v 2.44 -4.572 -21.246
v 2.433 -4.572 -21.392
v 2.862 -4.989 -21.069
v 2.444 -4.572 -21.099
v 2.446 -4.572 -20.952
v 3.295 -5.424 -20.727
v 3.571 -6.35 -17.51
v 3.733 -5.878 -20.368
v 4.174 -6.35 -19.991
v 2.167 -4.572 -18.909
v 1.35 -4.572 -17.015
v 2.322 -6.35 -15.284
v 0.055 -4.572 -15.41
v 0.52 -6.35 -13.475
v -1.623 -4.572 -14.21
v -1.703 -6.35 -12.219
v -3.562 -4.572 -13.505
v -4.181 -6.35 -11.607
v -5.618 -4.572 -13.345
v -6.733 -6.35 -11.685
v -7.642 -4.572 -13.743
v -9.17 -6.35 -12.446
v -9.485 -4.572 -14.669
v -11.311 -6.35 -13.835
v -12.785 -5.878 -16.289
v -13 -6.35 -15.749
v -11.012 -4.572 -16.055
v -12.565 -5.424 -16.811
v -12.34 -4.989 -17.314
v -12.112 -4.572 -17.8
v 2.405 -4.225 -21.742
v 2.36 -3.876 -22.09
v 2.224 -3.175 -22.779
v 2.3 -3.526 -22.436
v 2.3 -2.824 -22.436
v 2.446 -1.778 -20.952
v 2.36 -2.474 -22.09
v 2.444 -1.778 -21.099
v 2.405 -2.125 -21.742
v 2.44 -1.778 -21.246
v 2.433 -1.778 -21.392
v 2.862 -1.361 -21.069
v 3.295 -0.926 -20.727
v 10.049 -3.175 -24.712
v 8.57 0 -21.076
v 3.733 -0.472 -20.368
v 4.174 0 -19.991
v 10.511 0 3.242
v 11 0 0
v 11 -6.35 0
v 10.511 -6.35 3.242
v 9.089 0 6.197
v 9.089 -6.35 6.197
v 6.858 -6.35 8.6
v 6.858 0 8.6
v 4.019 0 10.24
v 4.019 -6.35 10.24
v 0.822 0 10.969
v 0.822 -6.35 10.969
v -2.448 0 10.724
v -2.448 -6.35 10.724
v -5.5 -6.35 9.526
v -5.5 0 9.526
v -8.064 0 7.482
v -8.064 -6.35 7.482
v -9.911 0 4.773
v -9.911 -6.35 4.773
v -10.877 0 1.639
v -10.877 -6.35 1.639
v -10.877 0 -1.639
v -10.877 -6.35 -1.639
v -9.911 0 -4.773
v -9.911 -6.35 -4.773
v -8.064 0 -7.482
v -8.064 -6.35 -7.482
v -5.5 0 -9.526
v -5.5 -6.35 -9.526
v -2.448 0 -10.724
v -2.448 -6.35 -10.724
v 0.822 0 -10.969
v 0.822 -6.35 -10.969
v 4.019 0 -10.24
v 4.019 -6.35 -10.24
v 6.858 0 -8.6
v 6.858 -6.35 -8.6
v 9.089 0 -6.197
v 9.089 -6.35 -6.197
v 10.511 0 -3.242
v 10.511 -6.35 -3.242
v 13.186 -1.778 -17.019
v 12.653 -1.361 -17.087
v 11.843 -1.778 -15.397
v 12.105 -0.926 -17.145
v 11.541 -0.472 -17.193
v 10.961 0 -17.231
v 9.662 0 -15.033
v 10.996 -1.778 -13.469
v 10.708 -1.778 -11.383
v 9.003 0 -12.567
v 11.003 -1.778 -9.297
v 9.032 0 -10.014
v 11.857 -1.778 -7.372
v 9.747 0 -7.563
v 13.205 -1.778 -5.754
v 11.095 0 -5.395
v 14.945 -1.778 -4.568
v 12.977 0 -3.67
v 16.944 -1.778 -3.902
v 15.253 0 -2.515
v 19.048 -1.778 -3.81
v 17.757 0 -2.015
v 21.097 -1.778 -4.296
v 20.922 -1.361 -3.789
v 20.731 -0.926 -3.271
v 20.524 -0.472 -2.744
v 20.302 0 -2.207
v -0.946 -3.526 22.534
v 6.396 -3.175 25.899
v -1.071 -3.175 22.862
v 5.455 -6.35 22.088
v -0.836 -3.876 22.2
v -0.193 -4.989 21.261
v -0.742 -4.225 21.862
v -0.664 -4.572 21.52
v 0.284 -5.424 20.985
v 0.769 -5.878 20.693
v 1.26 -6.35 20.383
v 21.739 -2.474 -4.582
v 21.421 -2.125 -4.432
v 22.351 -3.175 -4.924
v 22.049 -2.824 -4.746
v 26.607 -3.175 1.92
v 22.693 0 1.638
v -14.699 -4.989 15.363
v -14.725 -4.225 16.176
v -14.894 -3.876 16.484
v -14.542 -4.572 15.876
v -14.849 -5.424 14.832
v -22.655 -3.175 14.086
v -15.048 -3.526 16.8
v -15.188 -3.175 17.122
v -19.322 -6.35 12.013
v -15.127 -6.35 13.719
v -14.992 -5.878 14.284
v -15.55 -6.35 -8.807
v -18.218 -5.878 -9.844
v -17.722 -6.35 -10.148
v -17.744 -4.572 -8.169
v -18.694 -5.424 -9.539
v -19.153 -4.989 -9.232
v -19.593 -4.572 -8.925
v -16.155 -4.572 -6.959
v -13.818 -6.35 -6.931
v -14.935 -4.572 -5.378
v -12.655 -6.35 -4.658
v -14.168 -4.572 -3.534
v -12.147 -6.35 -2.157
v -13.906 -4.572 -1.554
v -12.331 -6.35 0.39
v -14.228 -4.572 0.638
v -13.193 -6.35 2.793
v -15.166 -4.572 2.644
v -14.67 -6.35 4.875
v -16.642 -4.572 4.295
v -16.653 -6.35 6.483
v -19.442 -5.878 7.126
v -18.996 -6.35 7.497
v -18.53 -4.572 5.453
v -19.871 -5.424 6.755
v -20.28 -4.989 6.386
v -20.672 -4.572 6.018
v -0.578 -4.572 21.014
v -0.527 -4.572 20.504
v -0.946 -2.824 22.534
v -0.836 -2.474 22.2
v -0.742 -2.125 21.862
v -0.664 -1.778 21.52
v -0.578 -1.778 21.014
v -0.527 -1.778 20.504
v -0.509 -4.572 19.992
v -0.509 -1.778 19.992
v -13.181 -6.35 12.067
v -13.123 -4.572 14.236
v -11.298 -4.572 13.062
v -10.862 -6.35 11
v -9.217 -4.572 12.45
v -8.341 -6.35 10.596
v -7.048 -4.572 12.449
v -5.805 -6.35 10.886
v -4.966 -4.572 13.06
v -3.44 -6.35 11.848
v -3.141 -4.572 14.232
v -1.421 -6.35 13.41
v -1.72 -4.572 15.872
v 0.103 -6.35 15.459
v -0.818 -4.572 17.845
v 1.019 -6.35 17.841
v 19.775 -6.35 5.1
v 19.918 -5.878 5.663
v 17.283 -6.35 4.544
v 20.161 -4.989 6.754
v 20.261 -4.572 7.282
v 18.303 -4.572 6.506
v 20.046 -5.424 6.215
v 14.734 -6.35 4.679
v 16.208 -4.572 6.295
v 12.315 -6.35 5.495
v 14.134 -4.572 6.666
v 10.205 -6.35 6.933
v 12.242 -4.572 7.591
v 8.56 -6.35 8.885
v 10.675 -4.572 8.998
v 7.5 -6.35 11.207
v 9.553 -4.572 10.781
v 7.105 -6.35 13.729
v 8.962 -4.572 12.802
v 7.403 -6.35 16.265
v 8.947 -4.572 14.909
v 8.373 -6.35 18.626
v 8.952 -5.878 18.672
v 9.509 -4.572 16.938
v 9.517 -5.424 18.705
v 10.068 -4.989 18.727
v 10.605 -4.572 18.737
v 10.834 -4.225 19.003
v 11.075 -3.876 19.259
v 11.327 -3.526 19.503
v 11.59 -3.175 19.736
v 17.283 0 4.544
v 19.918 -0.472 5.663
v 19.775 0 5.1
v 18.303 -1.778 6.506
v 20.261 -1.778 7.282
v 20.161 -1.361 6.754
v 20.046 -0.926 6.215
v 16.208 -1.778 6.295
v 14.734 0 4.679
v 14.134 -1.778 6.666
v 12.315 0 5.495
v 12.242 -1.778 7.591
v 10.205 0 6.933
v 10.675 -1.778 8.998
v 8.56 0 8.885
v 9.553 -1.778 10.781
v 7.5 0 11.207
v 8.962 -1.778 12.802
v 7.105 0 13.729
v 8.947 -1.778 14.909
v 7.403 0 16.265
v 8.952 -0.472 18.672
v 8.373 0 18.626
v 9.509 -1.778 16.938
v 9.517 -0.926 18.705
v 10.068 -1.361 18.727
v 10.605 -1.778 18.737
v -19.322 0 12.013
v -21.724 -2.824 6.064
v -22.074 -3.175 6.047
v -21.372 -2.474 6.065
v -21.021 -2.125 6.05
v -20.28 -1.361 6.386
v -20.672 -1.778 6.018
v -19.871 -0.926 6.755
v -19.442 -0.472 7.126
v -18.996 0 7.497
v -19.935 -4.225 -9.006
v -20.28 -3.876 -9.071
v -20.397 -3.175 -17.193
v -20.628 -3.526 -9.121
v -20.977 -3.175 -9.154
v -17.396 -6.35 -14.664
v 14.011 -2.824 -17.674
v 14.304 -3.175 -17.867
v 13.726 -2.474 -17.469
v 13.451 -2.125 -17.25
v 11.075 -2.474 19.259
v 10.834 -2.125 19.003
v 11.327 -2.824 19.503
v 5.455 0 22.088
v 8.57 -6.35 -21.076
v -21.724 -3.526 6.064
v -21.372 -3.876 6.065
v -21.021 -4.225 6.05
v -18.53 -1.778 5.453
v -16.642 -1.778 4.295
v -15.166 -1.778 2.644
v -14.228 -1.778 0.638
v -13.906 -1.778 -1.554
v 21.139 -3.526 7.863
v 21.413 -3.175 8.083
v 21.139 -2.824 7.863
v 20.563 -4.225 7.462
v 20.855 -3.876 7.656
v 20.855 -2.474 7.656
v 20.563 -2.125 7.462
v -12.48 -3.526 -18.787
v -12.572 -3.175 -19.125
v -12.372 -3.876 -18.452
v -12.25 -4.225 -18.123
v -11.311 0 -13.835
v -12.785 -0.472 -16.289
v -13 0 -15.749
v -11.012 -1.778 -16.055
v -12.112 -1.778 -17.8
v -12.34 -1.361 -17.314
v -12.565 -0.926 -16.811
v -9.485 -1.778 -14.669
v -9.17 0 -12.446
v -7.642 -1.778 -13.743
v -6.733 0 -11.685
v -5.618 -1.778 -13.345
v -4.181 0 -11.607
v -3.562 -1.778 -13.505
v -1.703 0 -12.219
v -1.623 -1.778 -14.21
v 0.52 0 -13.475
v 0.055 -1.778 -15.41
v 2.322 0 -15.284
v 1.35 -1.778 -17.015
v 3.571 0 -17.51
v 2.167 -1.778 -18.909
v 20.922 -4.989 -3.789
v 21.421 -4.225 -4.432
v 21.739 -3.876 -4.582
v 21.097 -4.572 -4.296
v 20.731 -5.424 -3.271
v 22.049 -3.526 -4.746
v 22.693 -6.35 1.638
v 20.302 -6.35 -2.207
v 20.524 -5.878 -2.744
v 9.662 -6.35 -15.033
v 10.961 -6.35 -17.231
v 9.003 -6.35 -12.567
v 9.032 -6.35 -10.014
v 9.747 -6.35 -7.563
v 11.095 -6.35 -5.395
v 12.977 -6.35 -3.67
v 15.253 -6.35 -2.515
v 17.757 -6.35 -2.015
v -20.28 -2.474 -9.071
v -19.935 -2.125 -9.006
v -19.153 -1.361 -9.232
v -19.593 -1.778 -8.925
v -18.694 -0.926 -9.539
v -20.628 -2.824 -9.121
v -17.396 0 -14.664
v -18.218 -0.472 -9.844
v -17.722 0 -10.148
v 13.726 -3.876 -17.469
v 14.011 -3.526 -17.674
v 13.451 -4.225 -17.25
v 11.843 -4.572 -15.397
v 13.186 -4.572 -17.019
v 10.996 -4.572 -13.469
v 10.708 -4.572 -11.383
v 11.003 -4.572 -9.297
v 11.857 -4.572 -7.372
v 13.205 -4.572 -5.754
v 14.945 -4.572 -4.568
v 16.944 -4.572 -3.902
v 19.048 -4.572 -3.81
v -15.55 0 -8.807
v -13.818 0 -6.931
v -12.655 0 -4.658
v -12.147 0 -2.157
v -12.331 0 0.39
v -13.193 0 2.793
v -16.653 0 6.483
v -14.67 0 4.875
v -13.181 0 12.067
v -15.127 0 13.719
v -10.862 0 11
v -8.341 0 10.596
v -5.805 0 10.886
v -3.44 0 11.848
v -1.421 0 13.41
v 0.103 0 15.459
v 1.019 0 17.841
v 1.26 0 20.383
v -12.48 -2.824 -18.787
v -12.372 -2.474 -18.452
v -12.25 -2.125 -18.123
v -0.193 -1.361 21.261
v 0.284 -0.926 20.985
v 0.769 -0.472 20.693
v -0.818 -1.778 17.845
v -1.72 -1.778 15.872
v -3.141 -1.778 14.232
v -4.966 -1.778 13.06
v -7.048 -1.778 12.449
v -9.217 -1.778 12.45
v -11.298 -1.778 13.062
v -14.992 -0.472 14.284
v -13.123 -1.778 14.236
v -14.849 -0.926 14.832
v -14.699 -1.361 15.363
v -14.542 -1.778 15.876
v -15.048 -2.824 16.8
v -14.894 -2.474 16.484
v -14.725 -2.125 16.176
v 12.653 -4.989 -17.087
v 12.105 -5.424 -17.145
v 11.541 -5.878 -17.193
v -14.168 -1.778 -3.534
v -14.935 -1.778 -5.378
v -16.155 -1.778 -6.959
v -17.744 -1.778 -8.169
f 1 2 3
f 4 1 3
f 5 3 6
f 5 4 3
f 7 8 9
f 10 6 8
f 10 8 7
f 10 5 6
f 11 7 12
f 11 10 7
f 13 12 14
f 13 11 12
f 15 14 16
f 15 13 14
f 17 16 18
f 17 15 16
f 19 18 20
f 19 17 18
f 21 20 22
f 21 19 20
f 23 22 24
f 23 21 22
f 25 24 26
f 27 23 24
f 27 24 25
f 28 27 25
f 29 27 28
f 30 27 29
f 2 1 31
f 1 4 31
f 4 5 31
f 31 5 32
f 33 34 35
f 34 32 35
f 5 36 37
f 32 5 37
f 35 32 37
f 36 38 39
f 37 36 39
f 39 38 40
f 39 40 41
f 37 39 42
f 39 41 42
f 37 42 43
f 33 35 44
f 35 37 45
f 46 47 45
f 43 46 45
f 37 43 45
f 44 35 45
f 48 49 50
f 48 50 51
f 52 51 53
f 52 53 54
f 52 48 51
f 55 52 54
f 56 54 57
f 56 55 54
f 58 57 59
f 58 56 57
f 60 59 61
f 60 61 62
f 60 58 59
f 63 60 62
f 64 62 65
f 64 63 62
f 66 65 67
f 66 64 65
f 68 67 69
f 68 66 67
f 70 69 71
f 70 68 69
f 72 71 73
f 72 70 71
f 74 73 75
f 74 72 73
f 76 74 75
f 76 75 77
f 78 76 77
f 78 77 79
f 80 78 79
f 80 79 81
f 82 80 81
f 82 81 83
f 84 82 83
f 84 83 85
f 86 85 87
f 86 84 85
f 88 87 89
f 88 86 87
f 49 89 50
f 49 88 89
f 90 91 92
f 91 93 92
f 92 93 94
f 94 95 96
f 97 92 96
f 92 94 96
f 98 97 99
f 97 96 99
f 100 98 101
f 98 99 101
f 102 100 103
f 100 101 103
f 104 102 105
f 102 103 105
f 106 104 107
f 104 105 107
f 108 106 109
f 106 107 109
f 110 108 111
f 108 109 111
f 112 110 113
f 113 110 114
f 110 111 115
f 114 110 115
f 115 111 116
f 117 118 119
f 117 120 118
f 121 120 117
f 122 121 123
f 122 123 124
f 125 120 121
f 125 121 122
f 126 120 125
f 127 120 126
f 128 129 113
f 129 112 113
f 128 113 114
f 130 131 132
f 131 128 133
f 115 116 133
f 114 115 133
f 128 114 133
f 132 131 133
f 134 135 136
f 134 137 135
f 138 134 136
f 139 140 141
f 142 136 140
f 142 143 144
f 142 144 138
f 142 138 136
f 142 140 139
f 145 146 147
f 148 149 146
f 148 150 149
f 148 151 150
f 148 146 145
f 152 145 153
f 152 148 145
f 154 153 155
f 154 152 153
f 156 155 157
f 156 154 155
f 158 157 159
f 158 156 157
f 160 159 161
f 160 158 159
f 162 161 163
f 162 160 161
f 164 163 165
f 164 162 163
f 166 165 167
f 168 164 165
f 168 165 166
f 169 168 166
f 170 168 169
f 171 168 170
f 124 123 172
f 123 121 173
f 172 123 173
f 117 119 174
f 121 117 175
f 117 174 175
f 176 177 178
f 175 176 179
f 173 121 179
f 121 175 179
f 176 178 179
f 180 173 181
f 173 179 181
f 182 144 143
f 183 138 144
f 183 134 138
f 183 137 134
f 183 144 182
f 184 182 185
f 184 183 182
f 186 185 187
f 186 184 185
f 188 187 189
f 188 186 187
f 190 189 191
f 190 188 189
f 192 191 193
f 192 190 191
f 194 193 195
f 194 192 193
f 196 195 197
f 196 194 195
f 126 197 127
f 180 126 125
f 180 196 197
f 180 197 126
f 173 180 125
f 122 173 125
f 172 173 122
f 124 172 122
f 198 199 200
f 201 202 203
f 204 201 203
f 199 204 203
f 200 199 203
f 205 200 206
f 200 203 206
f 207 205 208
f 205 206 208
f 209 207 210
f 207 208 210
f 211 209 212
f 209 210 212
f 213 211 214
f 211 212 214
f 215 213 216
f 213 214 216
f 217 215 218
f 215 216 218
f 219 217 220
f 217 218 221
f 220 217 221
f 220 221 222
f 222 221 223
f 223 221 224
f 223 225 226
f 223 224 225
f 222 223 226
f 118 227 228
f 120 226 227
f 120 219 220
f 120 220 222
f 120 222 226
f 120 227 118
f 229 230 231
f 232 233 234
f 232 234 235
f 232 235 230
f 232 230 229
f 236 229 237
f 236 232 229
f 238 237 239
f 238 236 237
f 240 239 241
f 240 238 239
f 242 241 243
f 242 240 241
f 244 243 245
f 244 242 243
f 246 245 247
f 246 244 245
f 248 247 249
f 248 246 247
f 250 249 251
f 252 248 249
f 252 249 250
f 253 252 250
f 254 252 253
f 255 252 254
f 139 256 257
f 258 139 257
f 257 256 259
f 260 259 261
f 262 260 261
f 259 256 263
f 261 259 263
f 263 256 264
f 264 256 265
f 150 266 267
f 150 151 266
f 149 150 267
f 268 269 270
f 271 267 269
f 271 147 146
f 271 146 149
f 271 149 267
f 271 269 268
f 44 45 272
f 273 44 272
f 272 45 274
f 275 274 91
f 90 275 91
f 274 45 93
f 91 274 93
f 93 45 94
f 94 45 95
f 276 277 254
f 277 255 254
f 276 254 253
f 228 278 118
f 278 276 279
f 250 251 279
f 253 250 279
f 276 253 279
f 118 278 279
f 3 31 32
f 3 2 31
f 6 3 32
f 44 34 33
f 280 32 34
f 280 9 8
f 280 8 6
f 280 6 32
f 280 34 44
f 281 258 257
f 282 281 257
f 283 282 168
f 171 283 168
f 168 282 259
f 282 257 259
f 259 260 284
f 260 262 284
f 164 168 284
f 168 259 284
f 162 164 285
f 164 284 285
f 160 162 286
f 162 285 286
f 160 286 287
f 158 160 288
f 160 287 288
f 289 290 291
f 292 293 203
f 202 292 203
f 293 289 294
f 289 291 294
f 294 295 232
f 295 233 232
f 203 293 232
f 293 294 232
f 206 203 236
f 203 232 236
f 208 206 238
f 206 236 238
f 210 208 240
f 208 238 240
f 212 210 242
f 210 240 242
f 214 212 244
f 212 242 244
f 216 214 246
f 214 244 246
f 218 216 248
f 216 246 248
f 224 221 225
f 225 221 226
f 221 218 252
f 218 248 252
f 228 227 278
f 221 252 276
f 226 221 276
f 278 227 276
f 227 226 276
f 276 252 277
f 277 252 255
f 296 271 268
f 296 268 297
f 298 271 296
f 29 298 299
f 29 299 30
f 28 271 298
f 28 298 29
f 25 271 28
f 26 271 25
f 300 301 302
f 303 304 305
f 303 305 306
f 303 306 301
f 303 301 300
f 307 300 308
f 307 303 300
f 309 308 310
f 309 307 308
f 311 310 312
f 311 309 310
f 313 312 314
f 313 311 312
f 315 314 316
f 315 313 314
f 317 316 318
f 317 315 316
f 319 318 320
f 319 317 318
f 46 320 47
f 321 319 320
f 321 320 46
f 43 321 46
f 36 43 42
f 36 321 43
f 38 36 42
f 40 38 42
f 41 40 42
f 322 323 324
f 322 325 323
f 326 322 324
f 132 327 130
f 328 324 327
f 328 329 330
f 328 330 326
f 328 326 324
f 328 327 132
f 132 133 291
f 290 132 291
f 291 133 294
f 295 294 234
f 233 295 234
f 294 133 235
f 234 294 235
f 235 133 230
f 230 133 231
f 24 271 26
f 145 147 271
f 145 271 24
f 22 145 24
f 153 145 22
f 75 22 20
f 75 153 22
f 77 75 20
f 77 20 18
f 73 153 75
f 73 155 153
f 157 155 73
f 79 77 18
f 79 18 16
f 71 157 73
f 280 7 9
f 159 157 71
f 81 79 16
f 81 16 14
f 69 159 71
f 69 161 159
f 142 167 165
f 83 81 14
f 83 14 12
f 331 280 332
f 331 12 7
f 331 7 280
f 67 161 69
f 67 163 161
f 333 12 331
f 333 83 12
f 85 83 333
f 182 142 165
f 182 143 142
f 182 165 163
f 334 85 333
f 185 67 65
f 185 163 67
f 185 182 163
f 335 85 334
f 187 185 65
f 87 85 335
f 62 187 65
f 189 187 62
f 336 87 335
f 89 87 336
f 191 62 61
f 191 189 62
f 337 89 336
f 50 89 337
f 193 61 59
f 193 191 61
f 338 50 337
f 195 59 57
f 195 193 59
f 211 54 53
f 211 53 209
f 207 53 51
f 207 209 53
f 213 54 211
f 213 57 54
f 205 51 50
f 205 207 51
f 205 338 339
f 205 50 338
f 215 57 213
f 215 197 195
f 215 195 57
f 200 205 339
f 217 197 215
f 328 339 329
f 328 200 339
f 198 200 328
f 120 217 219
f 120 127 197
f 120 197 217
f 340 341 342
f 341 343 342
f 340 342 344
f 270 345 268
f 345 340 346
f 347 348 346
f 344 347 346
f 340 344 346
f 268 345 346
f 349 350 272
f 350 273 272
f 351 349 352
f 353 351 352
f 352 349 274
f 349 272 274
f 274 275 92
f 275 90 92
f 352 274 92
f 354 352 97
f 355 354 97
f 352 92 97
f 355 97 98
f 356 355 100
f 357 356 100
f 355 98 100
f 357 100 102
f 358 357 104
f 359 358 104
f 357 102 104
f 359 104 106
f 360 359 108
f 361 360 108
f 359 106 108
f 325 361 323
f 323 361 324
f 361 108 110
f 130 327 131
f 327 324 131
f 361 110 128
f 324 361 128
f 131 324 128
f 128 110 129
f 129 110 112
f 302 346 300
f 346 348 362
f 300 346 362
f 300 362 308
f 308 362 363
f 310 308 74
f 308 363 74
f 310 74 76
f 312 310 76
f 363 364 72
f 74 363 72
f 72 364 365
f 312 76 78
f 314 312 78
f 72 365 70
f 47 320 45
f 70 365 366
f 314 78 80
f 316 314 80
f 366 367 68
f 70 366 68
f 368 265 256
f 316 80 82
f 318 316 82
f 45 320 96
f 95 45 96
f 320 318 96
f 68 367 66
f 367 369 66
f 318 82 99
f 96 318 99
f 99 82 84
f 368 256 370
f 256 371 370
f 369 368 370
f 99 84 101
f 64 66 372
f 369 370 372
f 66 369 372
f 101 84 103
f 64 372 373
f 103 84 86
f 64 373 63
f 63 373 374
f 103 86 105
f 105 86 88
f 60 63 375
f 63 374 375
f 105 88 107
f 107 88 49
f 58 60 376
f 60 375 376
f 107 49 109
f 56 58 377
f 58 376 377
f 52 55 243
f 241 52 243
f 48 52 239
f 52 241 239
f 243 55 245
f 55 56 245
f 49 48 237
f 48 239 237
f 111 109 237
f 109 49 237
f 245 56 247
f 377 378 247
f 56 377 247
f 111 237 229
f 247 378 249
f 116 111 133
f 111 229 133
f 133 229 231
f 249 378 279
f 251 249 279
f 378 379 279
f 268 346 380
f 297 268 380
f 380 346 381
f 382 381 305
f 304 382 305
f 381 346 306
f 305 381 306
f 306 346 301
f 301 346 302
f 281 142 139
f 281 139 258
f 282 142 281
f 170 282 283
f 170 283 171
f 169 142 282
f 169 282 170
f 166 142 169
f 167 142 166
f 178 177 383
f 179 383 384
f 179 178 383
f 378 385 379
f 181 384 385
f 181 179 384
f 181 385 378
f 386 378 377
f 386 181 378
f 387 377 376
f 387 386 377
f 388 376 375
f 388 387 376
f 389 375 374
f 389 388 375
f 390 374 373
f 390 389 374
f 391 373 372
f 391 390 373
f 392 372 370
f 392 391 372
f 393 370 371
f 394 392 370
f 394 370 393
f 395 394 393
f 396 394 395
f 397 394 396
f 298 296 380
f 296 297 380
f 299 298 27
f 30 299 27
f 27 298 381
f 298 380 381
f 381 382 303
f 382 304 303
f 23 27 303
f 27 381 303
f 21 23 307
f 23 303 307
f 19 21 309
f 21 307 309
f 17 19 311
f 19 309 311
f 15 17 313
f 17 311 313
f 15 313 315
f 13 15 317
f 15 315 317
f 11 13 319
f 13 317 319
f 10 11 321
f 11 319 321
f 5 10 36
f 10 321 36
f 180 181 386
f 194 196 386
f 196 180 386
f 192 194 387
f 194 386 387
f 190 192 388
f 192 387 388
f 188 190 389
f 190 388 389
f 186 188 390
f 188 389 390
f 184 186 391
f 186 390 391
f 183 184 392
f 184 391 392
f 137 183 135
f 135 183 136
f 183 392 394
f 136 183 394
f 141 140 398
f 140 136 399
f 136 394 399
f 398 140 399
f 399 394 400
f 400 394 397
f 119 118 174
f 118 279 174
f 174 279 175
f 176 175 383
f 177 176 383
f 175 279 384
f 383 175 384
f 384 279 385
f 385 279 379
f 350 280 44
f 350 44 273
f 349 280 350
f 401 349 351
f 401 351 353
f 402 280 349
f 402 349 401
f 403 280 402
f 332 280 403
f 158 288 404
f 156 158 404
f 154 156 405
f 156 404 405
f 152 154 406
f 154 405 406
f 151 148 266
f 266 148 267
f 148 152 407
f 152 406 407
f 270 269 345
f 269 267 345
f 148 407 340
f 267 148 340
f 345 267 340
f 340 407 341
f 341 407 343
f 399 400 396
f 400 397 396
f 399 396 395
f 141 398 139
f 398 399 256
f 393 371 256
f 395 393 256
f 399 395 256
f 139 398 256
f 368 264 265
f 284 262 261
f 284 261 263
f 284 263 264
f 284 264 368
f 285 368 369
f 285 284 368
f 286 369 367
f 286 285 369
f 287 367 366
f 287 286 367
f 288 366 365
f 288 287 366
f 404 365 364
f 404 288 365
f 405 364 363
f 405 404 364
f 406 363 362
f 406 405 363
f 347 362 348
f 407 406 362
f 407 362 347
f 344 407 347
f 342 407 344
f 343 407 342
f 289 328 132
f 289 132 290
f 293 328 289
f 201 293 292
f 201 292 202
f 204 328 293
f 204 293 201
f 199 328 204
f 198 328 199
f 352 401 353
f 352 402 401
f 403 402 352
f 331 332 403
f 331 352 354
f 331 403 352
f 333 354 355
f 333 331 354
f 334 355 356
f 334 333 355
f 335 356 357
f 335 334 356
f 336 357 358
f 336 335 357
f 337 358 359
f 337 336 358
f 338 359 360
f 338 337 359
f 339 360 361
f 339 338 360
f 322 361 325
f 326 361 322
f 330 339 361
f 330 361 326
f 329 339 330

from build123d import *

# Parameters (mm, degrees)
F0_R         = 11
F1_DEPTH     = 6.35
F2_SIZE      = 3.17499
F3_T2_ANGLE  = 199.5715846066
F3_T4_ANGLE  = 199.5715846066
F3_T6_ANGLE  = 199.5715846066
F3_T8_ANGLE  = 199.5715846066
F3_T10_ANGLE = 199.5715846066
F3_T12_ANGLE = 199.5715846066
F3_T14_ANGLE = 199.5715846066
F3_T16_ANGLE = 199.5715846066
F3_T18_ANGLE = 199.5715846066
F3_T20_ANGLE = 199.5715846066


# Not quite as in the source:
# - a fillet or chamfer that OpenCascade refuses, or shapes differently, is made with other operations: its cross-section is extruded or revolved along the edge and cut away or added
# - a fillet or chamfer is up to 0.001 mm smaller than in the source, because OpenCascade refuses the exact size


with BuildPart() as f1:
    # F0 (on Front) → F1 (new body)
    with BuildSketch(Plane.XZ):
        with BuildLine():
            Line((11.5903794876, 19.7357752055), (6.395639386, 25.8985348046))
            Line((6.395639386, 25.8985348046), (-1.0707562618, 22.8624408289))
            ThreePointArc((-1.0707562618, 22.8624408289), (-0.6511189694, 21.4544603732), (-0.5094848211, 19.9921183513))
            ThreePointArc((-0.5094848211, 19.9921183513), (-6.6671427992, 12.5137524996), (-15.1882133804, 17.1217958736))
            Line((-15.1882133804, 17.1217958736), (-22.6546090282, 14.085701898))
            Line((-22.6546090282, 14.085701898), (-22.0743552105, 6.0465330289))
            ThreePointArc((-22.0743552105, 6.0465330289), (-16.3352014079, 4.025037517), (-13.9057833978, -1.5536951891))
            ThreePointArc((-13.9057833978, -1.5536951891), (-15.9470506916, -6.744277179), (-20.977211585, -9.1539234072))
            Line((-20.977211585, -9.1539234072), (-20.3969577673, -17.1930922762))
            Line((-20.3969577673, -17.1930922762), (-12.5719455381, -19.125477903))
            ThreePointArc((-12.5719455381, -19.125477903), (-4.2540087238, -13.3881176755), (2.4458190468, -20.9523547863))
            ThreePointArc((2.4458190468, -20.9523547863), (2.3900561576, -21.8725270157), (2.2235836317, -22.7792316697))
            Line((2.2235836317, -22.7792316697), (10.0485958609, -24.7116172964))
            Line((10.0485958609, -24.7116172964), (14.3044655632, -17.866728424))
            ThreePointArc((14.3044655632, -17.866728424), (11.8568074939, -7.3720740717), (22.3514618462, -4.9244160023))
            Line((22.3514618462, -4.9244160023), (26.6073315486, 1.9204728701))
            Line((26.6073315486, 1.9204728701), (21.412591447, 8.0832324691))
            ThreePointArc((21.412591447, 8.0832324691), (10.6752140991, 8.9983978576), (11.5903794876, 19.7357752055))
        make_face()
        Circle(F0_R, mode=Mode.SUBTRACT)
    extrude(amount=F1_DEPTH)

    # F2 (size 3.175 in the source; OpenCascade refuses exactly that, so slightly less here)
    f2_edges = [f1.edges().sort_by_distance(p)[0] for p in [
        (24.479397, -6.35, -1.501972),
        (24.009961, -6.35, 5.001853),
        (8.993009, -6.35, 22.817155),
        (2.662442, -6.35, 24.380488),
        (-18.921411, -6.35, 15.603749),
        (-22.364482, -6.35, 10.066117),
        (-20.687085, -6.35, -13.173508),
        (-16.484452, -6.35, -18.159285),
        (24.009961, 0, 5.001853),
        (24.479397, 0, -1.501972),
        (8.993009, 0, 22.817155),
        (2.662442, 0, 24.380488),
        (-18.921411, 0, 15.603749),
        (-22.364482, 0, 10.066117),
        (-20.687085, 0, -13.173508),
        (-16.484452, 0, -18.159285),
        (6.13609, 0, -23.745424),
        (12.176531, 0, -21.289173),
        (12.176531, -6.35, -21.289173),
        (6.13609, -6.35, -23.745424),
    ]]
    chamfer(f2_edges, length=F2_SIZE)

    # F3: chamfer of 1.778 on 10 edges, made by hand

    # F3_s1 → F3_t2 (revolve, cut)
    with BuildSketch(Plane(origin=(19.7071717725, 0, -7.9965849701), x_dir=(0, 1, 0), z_dir=(0.9266214967, 0, -0.3759954812))):
        Polygon((-1.778, -11.2881506475), (0, -13.0661506475), (0, -11.2881506475), align=None)
    revolve(axis=Axis((18.3279637047, 0, -11.3955722132), (0, 1, 0)), revolution_arc=F3_T2_ANGLE, mode=Mode.SUBTRACT)

    # F3_s3 → F3_t4 (revolve, cut)
    with BuildSketch(Plane(origin=(19.7071717725, 0, -7.9965849701), x_dir=(0, 1, 0), z_dir=(0.9266214967, 0, -0.3759954812))):
        Polygon((-4.572, -11.2881506475), (-6.35, -13.0661506475), (-6.35, -11.2881506475), align=None)
    revolve(axis=Axis((18.3279637047, -6.35, -11.3955722132), (0, 1, 0)), revolution_arc=F3_T4_ANGLE, mode=Mode.SUBTRACT)

    # F3_s5 → F3_t6 (revolve, cut)
    with BuildSketch(Plane(origin=(-8.534063628, 0, -19.4804452837), x_dir=(0, 1, 0), z_dir=(-0.4012674626, 0, -0.915960929))):
        Polygon((-6.35, 13.0661506475), (-4.572, 11.2881506475), (-6.35, 11.2881506475), align=None)
    revolve(axis=Axis((-5.1741809532, -6.35, -20.9523547863), (0, -1, 0)), revolution_arc=F3_T6_ANGLE, mode=Mode.SUBTRACT)

    # F3_s7 → F3_t8 (revolve, cut)
    with BuildSketch(Plane(origin=(-1.5153532552, 0, -21.2137147847), x_dir=(0, 1, 0), z_dir=(-0.0712511627, 0, -0.9974584061))):
        Polygon((0, -13.0661506475), (-1.778, -11.2881506475), (0, -11.2881506475), align=None)
    revolve(axis=Axis((-5.1741809532, 0, -20.9523547863), (0, 1, 0)), revolution_arc=F3_T8_ANGLE, mode=Mode.SUBTRACT)

    # F3_s9 → F3_t10 (revolve, cut)
    with BuildSketch(Plane(origin=(-21.1641751195, 0, 2.0965881732), x_dir=(0, 1, 0), z_dir=(-0.9951290754, 0, 0.0985805418))):
        Polygon((-6.35, 13.0661506475), (-4.572, 11.2881506475), (-6.35, 11.2881506475), align=None)
    revolve(axis=Axis((-21.5257833978, -6.35, -1.5536951891), (0, -1, 0)), revolution_arc=F3_T10_ANGLE, mode=Mode.SUBTRACT)

    # F3_s11 → F3_t12 (revolve, cut)
    with BuildSketch(Plane(origin=(-20.6437115892, 0, -5.1142117945), x_dir=(0, 1, 0), z_dir=(-0.9706571369, 0, -0.2404677161))):
        Polygon((0, -13.0661506475), (-1.778, -11.2881506475), (0, -11.2881506475), align=None)
    revolve(axis=Axis((-21.5257833978, 0, -1.5536951891), (0, 1, 0)), revolution_arc=F3_T12_ANGLE, mode=Mode.SUBTRACT)

    # F3_s13 → F3_t14 (revolve, cut)
    with BuildSketch(Plane(origin=(-4.5461159397, 0, 20.7762080351), x_dir=(0, 1, 0), z_dir=(-0.2137561292, 0, 0.9768870545))):
        Polygon((-6.35, 13.0661506475), (-4.572, 11.2881506475), (-6.35, 11.2881506475), align=None)
    revolve(axis=Axis((-8.1294848211, -6.35, 19.9921183513), (0, -1, 0)), revolution_arc=F3_T14_ANGLE, mode=Mode.SUBTRACT)

    # F3_s15 → F3_t16 (revolve, cut)
    with BuildSketch(Plane(origin=(-11.2431621609, 0, 18.0529580701), x_dir=(0, 1, 0), z_dir=(-0.5286479394, 0, 0.8488411843))):
        Polygon((0, -13.0661506475), (-1.778, -11.2881506475), (0, -11.2881506475), align=None)
    revolve(axis=Axis((-8.1294848211, 0, 19.9921183513), (0, 1, 0)), revolution_arc=F3_T16_ANGLE, mode=Mode.SUBTRACT)

    # F3_s17 → F3_t18 (revolve, cut)
    with BuildSketch(Plane(origin=(13.6950552327, 0, 16.2715534792), x_dir=(0, 1, 0), z_dir=(0.6439347423, 0, 0.7650804191))):
        Polygon((-6.35, -13.0661506475), (-4.572, -11.2881506475), (-6.35, -11.2881506475), align=None)
    revolve(axis=Axis((16.5014854673, -6.35, 13.9095038373), (0, 1, 0)), revolution_arc=F3_T18_ANGLE, mode=Mode.SUBTRACT)

    # F3_s19 → F3_t20 (revolve, cut)
    with BuildSketch(Plane(origin=(13.6950552327, 0, 16.2715534792), x_dir=(0, 1, 0), z_dir=(0.6439347423, 0, 0.7650804191))):
        Polygon((0, -13.0661506475), (-1.778, -11.2881506475), (0, -11.2881506475), align=None)
    revolve(axis=Axis((16.5014854673, 0, 13.9095038373), (0, 1, 0)), revolution_arc=F3_T20_ANGLE, mode=Mode.SUBTRACT)


solid = f1.part
